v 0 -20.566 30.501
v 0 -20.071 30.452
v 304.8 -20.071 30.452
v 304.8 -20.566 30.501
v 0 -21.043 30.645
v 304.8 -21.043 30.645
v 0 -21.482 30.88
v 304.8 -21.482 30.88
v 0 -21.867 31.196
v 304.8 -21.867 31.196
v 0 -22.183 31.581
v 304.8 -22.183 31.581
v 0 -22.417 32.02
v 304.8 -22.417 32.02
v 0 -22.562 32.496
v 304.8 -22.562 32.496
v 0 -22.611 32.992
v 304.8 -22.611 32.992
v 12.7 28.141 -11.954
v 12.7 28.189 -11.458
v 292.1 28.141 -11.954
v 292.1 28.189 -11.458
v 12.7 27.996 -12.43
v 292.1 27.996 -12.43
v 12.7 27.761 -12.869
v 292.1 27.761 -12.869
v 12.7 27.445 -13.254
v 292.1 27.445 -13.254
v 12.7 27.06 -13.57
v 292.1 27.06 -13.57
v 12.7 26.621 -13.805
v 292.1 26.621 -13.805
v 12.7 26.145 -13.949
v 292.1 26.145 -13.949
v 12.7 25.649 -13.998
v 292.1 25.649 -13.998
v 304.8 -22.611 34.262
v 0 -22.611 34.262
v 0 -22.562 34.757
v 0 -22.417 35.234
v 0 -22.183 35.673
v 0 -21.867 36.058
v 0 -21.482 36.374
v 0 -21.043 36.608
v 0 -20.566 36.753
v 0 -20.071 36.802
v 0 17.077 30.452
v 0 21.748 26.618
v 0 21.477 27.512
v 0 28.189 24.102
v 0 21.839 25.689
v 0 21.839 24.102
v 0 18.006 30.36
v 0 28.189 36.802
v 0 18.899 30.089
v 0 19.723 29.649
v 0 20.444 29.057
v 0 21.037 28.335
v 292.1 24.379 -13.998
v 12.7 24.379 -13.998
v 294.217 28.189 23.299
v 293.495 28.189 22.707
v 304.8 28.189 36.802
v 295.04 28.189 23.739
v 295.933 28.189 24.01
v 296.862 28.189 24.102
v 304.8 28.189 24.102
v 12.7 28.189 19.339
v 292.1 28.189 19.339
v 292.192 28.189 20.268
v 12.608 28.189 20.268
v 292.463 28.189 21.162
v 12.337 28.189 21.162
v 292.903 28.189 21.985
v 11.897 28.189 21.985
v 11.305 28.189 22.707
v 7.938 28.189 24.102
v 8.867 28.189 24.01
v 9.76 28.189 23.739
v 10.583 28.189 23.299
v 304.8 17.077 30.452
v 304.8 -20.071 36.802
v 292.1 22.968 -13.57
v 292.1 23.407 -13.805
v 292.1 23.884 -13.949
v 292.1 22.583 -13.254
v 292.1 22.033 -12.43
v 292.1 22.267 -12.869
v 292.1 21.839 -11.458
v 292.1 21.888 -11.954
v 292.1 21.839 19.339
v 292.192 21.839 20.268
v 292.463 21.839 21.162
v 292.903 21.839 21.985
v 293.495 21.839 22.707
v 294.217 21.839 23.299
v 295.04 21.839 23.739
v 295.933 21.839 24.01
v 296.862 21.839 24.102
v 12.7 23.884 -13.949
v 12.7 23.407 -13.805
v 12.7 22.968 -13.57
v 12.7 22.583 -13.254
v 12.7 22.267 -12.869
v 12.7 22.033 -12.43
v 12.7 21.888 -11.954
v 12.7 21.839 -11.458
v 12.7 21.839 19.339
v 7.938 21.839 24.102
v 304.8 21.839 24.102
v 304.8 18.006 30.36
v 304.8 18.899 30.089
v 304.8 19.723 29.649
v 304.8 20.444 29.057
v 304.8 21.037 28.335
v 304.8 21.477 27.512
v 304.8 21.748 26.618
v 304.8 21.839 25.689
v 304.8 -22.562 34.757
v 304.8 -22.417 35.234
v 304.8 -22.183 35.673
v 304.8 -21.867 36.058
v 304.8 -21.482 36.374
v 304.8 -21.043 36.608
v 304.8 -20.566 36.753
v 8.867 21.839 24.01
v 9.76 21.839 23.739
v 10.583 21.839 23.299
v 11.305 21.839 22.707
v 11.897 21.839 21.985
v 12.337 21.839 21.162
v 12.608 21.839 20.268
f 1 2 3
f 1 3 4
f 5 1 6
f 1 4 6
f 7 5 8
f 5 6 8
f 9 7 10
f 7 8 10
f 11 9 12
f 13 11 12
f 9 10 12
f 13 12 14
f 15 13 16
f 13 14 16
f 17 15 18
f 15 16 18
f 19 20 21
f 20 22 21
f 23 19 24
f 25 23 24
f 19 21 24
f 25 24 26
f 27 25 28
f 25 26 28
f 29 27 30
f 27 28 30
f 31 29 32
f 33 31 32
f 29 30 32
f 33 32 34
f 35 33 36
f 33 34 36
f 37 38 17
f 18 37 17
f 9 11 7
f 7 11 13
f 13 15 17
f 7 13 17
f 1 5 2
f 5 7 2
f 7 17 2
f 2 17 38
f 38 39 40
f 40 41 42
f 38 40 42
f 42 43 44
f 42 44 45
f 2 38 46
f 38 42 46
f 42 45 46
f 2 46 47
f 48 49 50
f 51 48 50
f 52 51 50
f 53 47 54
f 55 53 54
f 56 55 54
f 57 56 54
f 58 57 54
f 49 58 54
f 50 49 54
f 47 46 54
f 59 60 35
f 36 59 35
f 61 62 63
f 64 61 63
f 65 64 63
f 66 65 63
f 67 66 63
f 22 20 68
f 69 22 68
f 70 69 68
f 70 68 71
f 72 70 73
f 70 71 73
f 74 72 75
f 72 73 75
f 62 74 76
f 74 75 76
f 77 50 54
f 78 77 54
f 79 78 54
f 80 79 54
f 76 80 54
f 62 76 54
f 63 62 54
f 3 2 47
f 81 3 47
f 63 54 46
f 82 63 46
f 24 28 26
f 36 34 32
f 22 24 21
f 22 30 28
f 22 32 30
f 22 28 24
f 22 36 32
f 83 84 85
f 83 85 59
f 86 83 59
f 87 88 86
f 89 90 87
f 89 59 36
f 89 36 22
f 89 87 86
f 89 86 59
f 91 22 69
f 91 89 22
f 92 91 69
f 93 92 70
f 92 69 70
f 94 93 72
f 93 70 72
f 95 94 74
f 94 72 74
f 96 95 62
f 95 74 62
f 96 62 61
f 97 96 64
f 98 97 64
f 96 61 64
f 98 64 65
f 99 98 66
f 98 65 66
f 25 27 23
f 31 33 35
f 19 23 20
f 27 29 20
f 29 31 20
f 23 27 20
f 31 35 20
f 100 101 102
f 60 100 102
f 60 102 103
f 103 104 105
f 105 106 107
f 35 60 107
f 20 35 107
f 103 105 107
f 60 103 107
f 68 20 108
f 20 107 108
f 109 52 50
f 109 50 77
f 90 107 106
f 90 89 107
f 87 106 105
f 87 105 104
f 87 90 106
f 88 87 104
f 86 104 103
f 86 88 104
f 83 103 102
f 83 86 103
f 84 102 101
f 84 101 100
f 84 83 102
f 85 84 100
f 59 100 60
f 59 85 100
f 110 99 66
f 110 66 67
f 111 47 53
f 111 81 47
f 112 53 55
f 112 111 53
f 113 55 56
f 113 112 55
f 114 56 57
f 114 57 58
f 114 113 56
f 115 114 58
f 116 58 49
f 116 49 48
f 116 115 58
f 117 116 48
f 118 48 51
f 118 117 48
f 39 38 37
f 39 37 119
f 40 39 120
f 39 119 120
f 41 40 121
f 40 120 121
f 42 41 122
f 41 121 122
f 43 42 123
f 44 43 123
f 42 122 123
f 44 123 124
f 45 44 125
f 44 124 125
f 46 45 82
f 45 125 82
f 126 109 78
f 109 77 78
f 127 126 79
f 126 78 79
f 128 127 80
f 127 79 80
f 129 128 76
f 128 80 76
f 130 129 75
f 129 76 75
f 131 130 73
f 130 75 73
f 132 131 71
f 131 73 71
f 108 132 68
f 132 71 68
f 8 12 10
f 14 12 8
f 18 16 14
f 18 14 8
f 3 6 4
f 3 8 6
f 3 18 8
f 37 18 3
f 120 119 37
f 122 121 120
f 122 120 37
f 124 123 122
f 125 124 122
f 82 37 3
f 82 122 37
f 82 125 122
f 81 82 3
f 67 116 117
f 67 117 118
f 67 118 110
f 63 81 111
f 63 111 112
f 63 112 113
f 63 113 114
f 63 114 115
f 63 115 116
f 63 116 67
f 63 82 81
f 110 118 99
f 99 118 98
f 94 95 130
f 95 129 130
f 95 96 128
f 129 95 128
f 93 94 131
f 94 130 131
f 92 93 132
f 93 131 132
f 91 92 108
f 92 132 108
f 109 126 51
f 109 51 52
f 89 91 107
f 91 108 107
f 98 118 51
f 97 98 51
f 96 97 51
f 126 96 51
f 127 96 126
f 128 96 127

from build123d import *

# Parameters (mm, degrees)
F1_DEPTH = 304.8
F2_W     = 12.7
F2_H     = 38.1
F3_DEPTH = 25.4
F4_W     = 12.7
F4_H     = 38.1
F5_DEPTH = 25.4
F6_R     = 4.7625
F7_R     = 2.54
F8_R     = 4.7625


with BuildPart() as f1:
    # F0 (on Right) → F1 (new body)
    with BuildSketch(Plane.YZ):
        Polygon((28.189341, 36.801784), (-22.610659, 36.801784), (-22.610659, 30.451784), (21.839341, 30.451784), (21.839341, -13.998216), (28.189341, -13.998216), align=None)
    extrude(amount=F1_DEPTH)

    # F2 (on face) → F3 (cut)
    with BuildSketch(Plane.XZ.offset(-21.839341)):
        with Locations((6.35, 5.051784)):
            Rectangle(F2_W, F2_H)
    extrude(amount=-F3_DEPTH, mode=Mode.SUBTRACT)

    # F4 (on face) → F5 (cut)
    with BuildSketch(Plane.XZ.offset(-21.839341)):
        with Locations((298.45, 5.051784)):
            Rectangle(F4_W, F4_H)
    extrude(amount=-F5_DEPTH, mode=Mode.SUBTRACT)

    # F6
    f6_edges = [f1.edges().sort_by_distance(p)[0] for p in [
        (152.4, 21.839341, 30.451784),
    ]]
    fillet(f6_edges, radius=F6_R)

    # F7
    f7_edges = [f1.edges().sort_by_distance(p)[0] for p in [
        (152.4, -22.610659, 36.801784),
        (152.4, -22.610659, 30.451784),
        (152.4, 21.839341, -13.998216),
        (152.4, 28.189341, -13.998216),
    ]]
    fillet(f7_edges, radius=F7_R)

    # F8
    f8_edges = [f1.edges().sort_by_distance(p)[0] for p in [
        (292.1, 25.014341, 24.101784),
        (12.7, 25.014341, 24.101784),
    ]]
    fillet(f8_edges, radius=F8_R)


solid = f1.part
